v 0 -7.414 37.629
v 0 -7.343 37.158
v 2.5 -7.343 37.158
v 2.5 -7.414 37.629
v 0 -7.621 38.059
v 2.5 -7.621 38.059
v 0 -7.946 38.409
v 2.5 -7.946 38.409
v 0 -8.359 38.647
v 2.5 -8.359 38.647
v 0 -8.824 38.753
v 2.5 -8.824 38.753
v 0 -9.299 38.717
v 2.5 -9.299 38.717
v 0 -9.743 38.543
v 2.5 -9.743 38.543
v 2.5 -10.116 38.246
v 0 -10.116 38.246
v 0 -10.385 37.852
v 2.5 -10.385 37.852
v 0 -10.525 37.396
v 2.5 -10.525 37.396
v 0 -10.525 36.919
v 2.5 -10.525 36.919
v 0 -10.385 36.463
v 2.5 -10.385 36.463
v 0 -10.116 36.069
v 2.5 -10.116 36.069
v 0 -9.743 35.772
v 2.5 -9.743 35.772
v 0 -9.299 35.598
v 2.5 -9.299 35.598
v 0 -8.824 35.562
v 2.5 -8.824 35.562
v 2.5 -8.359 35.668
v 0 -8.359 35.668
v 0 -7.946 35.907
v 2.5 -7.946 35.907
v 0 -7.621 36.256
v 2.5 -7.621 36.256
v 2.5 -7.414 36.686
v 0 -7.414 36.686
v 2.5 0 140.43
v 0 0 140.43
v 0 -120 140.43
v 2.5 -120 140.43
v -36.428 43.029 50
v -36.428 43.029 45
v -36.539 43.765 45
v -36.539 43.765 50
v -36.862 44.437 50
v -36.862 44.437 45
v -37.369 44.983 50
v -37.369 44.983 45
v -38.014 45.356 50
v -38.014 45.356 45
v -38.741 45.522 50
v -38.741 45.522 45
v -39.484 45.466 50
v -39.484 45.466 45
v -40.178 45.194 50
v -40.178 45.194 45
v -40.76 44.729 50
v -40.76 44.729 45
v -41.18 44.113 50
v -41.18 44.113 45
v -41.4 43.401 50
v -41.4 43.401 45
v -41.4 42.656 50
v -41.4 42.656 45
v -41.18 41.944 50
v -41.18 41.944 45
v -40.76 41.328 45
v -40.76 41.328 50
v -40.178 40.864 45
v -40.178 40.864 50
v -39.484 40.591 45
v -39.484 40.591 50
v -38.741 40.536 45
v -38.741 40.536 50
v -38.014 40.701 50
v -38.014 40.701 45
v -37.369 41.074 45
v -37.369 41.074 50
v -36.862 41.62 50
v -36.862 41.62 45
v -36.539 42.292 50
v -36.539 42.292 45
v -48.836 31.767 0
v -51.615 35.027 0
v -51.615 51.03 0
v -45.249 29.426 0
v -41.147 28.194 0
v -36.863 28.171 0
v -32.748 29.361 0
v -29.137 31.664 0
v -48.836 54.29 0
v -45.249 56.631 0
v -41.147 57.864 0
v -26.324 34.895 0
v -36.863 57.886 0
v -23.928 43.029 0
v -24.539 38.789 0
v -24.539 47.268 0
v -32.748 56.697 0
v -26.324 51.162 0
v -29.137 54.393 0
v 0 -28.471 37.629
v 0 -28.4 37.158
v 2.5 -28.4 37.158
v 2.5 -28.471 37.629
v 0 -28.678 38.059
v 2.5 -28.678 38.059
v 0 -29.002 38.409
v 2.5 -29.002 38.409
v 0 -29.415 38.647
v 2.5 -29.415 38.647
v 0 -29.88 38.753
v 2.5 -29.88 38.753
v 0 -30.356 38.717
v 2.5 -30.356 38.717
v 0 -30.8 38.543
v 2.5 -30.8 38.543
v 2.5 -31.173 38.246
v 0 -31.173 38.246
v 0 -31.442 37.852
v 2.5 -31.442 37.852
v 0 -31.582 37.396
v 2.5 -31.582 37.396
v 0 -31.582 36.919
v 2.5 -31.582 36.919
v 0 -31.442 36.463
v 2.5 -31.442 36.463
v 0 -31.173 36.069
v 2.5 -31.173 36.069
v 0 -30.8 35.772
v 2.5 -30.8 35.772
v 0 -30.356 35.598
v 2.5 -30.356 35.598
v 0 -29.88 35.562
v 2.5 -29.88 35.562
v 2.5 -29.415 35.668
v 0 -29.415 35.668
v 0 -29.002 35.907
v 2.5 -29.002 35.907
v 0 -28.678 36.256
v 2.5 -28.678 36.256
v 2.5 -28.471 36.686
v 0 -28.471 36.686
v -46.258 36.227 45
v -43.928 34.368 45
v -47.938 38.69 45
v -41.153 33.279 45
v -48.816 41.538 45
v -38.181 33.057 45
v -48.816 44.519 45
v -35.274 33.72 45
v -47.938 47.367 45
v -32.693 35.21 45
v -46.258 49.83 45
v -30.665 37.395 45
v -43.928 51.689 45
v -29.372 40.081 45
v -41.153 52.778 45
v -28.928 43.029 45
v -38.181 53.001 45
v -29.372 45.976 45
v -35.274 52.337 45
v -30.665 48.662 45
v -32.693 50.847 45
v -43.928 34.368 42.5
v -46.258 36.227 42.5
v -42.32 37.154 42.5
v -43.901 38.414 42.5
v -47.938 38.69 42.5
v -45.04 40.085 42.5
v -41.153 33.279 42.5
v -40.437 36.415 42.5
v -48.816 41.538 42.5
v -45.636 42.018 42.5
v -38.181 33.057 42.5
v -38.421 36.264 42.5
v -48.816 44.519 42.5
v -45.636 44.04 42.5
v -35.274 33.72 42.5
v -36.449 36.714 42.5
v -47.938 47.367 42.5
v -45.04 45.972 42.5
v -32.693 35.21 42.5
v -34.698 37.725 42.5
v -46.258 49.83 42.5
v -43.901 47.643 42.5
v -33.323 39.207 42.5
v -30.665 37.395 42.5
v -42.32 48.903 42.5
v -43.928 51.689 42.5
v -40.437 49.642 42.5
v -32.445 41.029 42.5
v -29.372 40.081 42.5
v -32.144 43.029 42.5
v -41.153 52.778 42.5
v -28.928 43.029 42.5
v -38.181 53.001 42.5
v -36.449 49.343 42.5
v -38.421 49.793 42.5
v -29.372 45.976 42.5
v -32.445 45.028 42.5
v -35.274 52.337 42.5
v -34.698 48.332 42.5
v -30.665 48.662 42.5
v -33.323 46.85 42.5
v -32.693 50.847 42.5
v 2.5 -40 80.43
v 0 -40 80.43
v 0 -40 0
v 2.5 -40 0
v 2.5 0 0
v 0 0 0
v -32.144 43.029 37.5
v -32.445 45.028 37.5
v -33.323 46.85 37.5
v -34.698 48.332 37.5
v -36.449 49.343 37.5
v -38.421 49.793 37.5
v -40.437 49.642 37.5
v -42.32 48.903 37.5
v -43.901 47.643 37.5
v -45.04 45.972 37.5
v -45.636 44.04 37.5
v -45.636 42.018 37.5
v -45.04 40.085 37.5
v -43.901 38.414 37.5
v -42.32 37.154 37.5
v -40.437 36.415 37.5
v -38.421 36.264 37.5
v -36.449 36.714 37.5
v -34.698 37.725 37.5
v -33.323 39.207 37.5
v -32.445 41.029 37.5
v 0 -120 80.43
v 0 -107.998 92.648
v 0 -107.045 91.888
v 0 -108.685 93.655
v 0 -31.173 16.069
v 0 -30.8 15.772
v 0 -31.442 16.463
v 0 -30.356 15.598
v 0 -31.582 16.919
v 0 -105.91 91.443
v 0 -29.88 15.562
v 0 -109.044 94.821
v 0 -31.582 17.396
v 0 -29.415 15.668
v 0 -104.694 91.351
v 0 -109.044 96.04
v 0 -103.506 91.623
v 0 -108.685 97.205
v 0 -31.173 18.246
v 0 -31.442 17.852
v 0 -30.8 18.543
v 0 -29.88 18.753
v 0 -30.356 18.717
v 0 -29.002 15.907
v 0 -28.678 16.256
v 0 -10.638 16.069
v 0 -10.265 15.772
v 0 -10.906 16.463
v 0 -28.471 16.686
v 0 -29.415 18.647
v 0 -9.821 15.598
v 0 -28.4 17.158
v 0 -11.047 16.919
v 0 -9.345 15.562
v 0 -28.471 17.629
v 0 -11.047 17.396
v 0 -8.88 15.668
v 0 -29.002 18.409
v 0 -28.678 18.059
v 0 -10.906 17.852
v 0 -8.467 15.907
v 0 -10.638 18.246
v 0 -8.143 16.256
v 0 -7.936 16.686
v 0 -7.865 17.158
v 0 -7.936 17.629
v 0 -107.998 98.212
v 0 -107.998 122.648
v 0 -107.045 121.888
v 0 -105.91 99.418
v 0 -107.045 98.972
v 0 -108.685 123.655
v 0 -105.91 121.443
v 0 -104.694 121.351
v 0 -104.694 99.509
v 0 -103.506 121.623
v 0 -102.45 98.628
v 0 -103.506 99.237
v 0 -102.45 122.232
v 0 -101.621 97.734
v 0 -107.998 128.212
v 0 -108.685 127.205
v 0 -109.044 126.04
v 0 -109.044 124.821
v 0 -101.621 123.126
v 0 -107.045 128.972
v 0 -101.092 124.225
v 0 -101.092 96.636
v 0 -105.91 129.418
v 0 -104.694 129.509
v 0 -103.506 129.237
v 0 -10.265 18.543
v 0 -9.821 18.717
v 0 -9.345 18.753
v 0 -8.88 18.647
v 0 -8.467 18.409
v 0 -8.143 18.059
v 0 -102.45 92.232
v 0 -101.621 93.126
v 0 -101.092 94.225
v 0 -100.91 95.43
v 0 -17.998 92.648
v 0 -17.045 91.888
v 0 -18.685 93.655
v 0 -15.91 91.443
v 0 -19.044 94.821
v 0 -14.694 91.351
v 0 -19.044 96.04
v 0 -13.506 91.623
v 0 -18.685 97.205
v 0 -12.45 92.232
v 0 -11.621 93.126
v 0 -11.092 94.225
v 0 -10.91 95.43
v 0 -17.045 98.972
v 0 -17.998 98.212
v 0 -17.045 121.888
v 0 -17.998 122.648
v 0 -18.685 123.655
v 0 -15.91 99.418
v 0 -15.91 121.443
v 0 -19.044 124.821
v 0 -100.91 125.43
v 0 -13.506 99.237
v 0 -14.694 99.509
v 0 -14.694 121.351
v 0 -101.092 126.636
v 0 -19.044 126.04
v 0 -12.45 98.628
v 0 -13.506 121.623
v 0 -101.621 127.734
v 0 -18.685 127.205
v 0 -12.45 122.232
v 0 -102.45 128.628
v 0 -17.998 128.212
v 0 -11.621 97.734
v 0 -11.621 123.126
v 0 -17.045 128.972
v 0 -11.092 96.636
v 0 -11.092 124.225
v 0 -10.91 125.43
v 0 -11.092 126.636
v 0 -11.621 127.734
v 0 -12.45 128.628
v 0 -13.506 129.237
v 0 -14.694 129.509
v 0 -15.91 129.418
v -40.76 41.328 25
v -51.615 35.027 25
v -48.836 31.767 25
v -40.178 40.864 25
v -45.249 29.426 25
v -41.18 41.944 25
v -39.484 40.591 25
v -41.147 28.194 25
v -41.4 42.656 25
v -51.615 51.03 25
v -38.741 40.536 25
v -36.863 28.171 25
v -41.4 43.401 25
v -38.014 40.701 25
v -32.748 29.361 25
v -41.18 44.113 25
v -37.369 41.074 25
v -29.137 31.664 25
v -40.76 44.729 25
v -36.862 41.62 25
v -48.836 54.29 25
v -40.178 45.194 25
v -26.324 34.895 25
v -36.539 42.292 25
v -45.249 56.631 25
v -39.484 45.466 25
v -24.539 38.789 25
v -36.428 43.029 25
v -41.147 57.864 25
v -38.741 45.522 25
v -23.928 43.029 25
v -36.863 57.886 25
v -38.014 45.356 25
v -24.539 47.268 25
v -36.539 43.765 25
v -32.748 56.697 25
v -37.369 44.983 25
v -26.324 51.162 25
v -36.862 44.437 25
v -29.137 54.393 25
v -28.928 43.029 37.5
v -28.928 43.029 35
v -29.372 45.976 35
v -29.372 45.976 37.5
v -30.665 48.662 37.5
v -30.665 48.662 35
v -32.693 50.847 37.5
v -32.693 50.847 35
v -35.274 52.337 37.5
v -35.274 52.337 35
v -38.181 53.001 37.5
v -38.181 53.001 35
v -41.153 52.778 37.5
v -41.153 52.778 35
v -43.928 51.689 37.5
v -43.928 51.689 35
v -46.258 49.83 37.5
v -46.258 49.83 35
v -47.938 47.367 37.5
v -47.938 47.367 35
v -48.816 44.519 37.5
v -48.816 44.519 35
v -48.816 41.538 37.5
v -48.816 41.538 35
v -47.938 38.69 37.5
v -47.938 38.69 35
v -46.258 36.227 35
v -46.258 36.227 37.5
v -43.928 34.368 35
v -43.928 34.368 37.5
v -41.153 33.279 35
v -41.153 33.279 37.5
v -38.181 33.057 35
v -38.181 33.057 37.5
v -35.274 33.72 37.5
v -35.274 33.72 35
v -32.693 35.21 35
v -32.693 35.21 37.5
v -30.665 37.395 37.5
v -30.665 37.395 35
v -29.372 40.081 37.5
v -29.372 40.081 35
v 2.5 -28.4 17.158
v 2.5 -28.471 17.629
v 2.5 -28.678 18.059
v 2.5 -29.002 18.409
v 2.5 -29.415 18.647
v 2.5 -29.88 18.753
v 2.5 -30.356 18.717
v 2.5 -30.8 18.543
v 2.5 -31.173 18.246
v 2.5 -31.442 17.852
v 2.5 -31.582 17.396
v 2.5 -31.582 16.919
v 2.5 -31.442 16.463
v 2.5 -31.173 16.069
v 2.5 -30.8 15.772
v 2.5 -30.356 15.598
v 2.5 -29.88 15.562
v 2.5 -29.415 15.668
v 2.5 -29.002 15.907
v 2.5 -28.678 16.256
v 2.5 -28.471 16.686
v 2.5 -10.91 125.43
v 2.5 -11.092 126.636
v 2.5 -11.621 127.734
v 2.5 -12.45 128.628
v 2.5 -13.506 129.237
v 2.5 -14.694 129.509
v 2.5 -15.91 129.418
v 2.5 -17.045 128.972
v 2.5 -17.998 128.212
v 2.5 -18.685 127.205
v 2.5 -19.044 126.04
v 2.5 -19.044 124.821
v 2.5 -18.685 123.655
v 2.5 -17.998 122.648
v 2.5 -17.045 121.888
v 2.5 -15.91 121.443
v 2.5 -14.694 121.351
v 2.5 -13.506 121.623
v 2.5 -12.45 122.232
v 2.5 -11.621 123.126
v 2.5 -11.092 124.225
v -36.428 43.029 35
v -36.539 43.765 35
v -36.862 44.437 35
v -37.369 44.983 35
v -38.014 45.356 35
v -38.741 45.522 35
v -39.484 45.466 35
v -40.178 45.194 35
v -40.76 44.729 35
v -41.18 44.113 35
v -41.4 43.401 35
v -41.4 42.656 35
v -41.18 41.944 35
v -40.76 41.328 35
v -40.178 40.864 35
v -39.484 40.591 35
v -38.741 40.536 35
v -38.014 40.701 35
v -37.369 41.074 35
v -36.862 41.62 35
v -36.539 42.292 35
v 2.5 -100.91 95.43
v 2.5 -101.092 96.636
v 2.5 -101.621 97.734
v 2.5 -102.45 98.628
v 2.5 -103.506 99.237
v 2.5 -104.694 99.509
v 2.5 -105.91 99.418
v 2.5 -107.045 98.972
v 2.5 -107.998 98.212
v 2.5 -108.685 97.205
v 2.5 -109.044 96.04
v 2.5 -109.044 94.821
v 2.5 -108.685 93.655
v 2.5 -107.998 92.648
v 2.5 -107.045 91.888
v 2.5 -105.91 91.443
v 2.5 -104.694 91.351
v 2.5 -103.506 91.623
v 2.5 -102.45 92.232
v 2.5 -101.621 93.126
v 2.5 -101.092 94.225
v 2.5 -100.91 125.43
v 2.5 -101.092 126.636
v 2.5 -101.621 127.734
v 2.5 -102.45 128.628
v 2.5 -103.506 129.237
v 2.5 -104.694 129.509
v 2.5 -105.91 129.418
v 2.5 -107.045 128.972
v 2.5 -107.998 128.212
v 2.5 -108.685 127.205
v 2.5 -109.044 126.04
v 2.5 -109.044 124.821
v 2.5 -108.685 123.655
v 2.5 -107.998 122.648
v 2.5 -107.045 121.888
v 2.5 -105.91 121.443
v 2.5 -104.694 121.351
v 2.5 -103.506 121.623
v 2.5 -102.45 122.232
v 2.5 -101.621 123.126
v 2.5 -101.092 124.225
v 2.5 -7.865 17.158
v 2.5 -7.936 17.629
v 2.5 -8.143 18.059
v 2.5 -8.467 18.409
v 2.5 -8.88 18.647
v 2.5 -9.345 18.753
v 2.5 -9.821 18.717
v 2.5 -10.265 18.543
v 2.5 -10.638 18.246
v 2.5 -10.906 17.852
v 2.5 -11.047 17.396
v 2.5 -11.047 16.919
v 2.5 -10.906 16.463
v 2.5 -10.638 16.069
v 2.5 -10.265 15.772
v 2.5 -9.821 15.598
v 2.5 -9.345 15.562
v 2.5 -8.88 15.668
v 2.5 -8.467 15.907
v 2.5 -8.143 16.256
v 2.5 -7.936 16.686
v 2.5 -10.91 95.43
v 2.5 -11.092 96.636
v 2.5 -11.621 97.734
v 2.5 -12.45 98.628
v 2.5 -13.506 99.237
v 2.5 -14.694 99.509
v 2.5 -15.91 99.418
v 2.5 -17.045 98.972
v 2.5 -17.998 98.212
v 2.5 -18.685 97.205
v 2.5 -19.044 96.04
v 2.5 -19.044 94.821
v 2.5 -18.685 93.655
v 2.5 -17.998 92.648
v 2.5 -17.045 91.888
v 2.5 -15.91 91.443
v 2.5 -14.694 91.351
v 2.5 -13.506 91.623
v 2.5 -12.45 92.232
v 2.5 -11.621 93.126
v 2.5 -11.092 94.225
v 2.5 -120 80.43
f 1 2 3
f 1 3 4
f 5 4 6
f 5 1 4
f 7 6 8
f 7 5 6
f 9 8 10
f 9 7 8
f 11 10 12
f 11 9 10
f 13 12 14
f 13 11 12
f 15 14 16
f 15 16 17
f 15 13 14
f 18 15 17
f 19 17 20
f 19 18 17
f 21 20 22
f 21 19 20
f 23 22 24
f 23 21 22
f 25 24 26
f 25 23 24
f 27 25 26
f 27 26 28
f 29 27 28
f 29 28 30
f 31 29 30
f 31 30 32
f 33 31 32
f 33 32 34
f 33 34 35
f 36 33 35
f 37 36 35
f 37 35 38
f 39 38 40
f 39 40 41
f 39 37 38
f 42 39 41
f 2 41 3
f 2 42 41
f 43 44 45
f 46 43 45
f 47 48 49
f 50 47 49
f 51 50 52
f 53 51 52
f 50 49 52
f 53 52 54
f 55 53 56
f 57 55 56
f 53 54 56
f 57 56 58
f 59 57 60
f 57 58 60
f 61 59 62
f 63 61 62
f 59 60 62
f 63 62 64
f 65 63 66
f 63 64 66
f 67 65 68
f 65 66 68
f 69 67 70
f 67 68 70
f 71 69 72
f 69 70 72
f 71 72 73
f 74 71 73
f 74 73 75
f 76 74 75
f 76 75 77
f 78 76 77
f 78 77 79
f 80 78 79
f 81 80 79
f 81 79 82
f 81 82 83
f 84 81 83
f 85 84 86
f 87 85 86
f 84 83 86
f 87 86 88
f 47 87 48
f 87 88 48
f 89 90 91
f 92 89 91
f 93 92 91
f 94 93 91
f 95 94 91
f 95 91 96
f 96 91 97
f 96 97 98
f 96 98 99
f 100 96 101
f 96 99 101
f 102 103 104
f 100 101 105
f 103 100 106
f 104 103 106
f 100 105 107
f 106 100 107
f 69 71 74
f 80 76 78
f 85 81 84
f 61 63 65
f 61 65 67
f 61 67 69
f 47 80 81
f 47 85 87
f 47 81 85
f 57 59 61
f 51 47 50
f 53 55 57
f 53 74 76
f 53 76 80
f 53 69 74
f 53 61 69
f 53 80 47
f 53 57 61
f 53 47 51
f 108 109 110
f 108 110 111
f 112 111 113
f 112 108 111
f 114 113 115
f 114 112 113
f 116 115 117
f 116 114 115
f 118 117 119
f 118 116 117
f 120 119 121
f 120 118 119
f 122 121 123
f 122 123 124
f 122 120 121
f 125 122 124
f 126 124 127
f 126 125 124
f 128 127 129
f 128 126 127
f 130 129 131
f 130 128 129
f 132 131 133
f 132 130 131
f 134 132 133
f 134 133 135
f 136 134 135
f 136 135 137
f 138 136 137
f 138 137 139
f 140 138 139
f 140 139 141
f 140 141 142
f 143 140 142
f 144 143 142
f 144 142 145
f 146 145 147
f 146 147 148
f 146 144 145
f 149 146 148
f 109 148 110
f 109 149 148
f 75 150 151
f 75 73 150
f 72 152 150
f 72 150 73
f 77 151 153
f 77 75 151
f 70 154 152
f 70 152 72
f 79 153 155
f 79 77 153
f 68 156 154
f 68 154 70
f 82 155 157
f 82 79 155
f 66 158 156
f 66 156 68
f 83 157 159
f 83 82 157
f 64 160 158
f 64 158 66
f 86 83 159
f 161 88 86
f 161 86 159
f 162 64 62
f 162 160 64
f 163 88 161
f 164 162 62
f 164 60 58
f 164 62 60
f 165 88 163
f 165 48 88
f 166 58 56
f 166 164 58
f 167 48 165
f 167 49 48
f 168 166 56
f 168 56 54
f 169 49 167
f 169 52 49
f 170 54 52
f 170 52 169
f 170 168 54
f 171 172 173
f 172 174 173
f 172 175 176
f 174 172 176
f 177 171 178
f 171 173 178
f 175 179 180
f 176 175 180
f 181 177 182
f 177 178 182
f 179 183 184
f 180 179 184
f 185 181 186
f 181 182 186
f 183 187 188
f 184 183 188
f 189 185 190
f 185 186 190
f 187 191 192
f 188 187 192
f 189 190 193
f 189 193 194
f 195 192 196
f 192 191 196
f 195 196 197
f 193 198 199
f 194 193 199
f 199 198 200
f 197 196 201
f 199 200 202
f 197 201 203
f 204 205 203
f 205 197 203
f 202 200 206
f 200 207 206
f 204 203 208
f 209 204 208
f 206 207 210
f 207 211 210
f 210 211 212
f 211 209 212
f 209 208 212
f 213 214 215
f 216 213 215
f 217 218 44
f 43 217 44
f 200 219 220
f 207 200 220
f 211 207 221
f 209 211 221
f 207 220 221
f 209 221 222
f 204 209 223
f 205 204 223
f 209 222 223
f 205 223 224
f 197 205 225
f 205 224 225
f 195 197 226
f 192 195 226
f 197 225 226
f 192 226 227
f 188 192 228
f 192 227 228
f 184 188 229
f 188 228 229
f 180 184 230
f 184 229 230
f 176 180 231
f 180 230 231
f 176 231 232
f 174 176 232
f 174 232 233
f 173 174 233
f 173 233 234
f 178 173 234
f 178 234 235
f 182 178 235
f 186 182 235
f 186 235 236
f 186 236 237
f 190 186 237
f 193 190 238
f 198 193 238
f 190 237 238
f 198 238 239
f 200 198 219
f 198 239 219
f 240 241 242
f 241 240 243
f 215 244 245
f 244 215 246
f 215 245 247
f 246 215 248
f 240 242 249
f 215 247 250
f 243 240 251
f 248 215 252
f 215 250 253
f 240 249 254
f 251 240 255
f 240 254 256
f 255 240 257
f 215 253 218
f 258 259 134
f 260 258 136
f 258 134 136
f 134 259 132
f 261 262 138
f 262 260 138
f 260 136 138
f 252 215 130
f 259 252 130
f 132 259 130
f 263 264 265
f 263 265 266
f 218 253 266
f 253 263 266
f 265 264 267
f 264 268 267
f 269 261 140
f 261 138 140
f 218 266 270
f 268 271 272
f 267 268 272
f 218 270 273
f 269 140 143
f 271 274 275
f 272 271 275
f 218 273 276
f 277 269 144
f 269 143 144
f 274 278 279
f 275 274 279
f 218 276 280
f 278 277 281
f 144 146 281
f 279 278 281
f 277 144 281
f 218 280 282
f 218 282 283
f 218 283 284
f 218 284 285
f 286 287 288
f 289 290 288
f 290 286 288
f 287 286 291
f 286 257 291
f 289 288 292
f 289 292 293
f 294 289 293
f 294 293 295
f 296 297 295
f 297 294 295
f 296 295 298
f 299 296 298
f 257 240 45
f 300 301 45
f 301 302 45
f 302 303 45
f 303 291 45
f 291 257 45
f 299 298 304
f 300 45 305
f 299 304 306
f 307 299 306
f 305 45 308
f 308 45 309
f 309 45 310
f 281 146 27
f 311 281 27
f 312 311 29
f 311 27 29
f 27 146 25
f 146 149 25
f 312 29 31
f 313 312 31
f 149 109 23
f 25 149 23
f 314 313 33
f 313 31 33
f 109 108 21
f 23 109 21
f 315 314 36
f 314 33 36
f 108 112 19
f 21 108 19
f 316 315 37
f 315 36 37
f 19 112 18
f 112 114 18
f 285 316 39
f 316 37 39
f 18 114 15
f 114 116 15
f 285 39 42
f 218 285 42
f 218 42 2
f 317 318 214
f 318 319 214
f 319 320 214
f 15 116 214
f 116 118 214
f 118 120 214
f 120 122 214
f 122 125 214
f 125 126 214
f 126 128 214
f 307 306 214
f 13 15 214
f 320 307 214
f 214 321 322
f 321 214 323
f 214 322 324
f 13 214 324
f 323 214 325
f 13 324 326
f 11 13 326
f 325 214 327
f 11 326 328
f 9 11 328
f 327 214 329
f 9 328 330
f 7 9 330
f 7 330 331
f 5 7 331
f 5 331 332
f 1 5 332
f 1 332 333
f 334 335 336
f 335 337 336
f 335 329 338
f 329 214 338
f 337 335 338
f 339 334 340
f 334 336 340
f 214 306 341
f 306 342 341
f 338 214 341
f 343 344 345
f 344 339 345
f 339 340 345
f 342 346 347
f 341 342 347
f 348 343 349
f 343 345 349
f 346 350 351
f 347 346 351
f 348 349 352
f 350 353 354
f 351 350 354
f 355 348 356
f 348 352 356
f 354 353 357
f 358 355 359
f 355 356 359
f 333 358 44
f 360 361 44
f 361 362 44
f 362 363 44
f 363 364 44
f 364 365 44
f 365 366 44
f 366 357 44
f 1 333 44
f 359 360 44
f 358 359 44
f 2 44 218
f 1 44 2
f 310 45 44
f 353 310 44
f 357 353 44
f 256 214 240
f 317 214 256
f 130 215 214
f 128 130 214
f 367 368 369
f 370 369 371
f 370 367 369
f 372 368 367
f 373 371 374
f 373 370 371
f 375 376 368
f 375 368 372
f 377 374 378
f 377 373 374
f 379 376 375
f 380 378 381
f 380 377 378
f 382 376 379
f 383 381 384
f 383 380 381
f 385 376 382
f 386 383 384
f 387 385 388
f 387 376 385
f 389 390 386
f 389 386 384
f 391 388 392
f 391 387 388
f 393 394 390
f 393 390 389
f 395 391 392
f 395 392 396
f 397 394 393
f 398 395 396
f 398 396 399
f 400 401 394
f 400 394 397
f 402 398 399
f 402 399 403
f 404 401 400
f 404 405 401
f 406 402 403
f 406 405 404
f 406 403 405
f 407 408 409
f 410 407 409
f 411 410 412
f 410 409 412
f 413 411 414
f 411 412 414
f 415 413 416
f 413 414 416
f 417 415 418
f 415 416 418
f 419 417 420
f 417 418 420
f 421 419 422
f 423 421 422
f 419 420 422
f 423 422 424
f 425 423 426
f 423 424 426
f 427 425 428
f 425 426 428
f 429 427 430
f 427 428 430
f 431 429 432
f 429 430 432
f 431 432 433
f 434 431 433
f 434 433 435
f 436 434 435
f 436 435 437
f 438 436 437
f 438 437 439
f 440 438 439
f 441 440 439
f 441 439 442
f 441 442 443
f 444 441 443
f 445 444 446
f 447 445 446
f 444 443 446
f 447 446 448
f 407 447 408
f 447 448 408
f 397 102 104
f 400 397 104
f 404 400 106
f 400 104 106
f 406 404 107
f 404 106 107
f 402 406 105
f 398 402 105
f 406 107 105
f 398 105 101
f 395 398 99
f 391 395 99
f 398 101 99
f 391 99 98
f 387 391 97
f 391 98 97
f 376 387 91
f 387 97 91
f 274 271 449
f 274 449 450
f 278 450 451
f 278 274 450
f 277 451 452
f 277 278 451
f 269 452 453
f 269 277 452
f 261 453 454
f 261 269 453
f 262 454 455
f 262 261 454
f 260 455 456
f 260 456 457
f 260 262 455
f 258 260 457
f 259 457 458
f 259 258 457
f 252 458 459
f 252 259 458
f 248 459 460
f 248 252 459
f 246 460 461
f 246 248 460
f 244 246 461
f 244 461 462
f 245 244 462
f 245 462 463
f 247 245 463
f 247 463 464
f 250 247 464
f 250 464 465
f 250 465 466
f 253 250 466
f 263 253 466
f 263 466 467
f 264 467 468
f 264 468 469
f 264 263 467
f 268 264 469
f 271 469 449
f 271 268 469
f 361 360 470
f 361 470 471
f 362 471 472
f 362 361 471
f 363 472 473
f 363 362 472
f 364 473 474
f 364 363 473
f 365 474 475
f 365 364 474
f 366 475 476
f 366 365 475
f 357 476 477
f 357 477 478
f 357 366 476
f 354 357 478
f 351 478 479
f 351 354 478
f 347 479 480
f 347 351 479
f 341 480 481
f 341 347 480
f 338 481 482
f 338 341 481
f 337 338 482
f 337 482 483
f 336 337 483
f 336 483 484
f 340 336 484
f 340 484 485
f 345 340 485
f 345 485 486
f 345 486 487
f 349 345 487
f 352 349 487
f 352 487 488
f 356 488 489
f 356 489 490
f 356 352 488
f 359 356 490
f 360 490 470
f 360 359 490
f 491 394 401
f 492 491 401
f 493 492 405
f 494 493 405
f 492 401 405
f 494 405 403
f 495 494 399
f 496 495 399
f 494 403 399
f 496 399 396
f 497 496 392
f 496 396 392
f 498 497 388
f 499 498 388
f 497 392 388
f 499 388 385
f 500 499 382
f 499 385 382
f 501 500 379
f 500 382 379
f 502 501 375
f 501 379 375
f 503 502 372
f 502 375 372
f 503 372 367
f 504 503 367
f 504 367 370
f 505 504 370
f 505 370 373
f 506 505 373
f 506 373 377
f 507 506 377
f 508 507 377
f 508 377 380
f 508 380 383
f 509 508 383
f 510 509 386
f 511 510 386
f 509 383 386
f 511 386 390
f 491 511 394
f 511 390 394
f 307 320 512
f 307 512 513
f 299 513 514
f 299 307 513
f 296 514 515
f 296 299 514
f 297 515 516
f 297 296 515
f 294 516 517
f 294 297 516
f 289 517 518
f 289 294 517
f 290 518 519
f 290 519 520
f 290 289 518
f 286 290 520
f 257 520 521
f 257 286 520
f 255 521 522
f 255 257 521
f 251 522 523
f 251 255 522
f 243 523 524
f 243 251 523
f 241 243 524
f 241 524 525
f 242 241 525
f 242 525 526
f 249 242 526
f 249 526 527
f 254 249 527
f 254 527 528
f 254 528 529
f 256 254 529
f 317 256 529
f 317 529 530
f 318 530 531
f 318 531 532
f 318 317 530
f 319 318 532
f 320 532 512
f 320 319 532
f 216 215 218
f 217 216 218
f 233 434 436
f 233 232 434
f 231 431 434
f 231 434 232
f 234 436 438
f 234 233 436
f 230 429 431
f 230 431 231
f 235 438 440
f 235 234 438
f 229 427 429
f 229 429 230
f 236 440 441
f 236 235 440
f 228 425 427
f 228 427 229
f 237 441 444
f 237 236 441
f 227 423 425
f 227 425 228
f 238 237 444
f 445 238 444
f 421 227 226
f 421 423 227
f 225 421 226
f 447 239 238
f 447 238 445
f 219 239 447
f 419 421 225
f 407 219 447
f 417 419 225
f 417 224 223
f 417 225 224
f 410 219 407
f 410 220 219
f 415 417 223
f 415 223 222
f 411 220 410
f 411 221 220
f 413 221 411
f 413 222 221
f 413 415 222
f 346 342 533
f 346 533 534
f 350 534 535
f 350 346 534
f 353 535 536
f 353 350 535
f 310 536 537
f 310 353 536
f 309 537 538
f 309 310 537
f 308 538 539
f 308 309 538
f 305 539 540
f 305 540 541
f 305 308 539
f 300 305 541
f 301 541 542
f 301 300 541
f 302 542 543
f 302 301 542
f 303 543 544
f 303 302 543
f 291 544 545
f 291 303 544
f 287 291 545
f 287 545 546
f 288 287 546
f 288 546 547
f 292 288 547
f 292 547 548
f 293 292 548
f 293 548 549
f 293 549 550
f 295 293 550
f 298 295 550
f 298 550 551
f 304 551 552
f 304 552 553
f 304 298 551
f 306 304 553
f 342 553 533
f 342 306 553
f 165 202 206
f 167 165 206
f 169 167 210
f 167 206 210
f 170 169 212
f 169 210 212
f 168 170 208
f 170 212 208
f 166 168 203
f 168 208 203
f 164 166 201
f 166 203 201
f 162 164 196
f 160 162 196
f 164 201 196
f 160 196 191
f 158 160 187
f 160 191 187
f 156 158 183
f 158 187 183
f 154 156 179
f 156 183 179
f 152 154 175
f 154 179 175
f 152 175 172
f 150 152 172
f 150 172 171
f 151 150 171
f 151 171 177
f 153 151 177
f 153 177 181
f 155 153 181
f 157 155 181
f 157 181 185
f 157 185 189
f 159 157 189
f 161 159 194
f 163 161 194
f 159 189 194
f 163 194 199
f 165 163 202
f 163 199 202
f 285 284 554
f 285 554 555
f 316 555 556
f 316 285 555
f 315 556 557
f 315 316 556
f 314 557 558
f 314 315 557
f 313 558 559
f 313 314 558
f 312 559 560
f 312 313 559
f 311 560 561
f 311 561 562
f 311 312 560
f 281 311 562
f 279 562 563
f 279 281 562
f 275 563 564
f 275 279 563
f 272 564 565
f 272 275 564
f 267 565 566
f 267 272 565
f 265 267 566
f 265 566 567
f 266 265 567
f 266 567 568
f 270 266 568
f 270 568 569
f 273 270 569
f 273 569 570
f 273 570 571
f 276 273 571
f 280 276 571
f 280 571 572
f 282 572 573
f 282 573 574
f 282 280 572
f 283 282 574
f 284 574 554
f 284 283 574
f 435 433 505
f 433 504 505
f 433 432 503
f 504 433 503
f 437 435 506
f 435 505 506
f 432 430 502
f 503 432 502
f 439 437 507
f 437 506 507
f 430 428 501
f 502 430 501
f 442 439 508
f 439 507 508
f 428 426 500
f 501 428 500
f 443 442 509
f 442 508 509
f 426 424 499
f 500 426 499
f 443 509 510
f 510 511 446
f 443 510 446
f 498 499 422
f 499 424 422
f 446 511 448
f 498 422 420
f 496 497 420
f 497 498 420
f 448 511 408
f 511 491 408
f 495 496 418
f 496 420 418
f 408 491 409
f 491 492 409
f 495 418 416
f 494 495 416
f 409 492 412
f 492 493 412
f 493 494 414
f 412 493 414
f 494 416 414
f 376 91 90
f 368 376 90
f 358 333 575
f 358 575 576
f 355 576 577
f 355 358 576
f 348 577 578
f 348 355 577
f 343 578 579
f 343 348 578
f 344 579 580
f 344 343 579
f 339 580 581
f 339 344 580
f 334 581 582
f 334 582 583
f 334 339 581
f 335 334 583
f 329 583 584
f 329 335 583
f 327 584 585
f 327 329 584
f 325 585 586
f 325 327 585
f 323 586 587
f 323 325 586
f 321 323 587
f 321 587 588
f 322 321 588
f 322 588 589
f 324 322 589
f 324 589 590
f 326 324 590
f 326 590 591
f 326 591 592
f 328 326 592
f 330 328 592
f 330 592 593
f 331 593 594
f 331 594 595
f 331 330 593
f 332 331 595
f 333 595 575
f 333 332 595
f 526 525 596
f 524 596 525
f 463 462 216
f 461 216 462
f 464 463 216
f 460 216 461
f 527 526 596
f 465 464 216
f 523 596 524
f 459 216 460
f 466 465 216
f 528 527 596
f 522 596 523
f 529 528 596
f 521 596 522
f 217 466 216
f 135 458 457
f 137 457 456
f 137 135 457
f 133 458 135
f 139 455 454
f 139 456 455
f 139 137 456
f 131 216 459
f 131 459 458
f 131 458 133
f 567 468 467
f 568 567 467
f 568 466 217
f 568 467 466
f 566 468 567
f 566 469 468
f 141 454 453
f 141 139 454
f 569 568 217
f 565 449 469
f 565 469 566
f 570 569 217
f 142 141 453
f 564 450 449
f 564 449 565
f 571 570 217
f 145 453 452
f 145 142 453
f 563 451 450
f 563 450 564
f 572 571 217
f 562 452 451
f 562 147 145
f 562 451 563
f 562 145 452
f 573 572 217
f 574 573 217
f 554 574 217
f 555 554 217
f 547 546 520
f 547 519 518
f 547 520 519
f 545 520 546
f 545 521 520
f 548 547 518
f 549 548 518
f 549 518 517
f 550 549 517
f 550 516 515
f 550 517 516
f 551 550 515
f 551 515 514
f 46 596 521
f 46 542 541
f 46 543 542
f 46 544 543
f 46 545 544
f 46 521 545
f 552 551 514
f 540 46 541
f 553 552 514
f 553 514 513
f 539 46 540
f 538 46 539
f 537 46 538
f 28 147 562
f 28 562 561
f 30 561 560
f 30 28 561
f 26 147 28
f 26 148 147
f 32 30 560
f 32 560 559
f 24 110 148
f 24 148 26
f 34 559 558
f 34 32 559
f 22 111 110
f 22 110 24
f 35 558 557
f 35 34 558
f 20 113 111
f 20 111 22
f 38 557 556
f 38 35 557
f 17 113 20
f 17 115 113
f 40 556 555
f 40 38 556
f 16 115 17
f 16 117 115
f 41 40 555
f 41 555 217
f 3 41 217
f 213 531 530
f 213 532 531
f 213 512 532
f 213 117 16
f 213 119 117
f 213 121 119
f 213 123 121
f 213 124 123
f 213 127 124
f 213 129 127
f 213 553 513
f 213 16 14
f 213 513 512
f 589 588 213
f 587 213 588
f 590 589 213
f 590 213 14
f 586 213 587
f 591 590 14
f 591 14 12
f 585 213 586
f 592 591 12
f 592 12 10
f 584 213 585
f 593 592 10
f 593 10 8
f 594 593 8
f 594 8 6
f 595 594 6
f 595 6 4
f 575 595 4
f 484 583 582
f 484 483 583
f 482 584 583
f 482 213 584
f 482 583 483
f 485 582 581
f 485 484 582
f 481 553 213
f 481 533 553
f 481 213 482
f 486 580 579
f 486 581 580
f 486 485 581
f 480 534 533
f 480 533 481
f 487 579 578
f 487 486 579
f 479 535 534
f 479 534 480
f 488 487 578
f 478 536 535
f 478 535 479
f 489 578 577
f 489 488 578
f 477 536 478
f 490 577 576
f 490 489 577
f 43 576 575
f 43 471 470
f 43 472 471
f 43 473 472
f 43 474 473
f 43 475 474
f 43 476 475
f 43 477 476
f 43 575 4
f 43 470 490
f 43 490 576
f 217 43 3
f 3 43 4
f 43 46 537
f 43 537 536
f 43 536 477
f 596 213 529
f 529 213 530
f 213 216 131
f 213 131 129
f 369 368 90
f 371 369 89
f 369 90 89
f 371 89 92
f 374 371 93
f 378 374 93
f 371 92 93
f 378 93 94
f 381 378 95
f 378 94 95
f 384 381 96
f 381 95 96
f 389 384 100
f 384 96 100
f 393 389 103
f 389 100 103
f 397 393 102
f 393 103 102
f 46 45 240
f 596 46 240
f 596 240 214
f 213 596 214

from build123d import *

# Parameters (mm, degrees)
F0_R      = 1.6
F0_R_2    = 4.0900821391
F0_R_3    = 8.5154019065
F1_DEPTH  = 2.5
F3_DEPTH  = 25
F4_R      = 2.5
F5_DEPTH  = 10
F6_R      = 10
F6_R_2    = 2.5
F7_DEPTH  = 2.5
F8_R      = 6.7837537735
F9_DEPTH  = 5
F10_R     = 10
F10_R_2   = 6.7837537735
F11_DEPTH = 2.5
F12_R     = 2.5
F13_DEPTH = 5


with BuildPart() as f1:
    # F0 (on Right) → F1 (new body)
    with BuildSketch(Plane.YZ):
        Polygon((-40, 0), (0, 0), (0, 140.4301102979), (-120, 140.4301102979), (-120, 80.4301102979), (-40, 80.4301102979), align=None)
        with Locations((-30, 17.1576072229)):
            Circle(F0_R, mode=Mode.SUBTRACT)
        with Locations((-9.4648276111, 17.1576072229)):
            Circle(F0_R, mode=Mode.SUBTRACT)
        with Locations((-30, 37.1576072229)):
            Circle(F0_R, mode=Mode.SUBTRACT)
        with Locations((-8.9432526233, 37.1576072229)):
            Circle(F0_R, mode=Mode.SUBTRACT)
        with Locations((-105, 95.4301102979)):
            Circle(F0_R_2, mode=Mode.SUBTRACT)
        with Locations((-105, 125.4301102979)):
            Circle(F0_R_2, mode=Mode.SUBTRACT)
        with Locations((-15, 95.4301102979)):
            Circle(F0_R_2, mode=Mode.SUBTRACT)
        with Locations((-60, 110.4301102979)):
            Circle(F0_R_3, mode=Mode.SUBTRACT)
        with Locations((-15, 125.4301102979)):
            Circle(F0_R_2, mode=Mode.SUBTRACT)
        with Locations((-60, 110.4301102979)):
            Circle(F0_R_3)
    extrude(amount=F1_DEPTH)


with BuildPart() as f3:
    # F2 (on Top) → F3 (new body)
    with BuildSketch(Plane.XY):
        with BuildLine():
            ThreePointArc((-51.6152642667, 35.026761755), (-34.7631884448, 28.6183173725), (-23.927834481, 43.0285818875))
            ThreePointArc((-23.927834481, 43.0285818875), (-34.7631884448, 57.4388464025), (-51.6152642667, 51.0304020199))
            Line((-51.6152642667, 51.0304020199), (-51.6152642667, 43.0285818875))
            Line((-51.6152642667, 43.0285818875), (-51.6152642667, 35.026761755))
        make_face()
    extrude(amount=F3_DEPTH)

    # F4 (on face) → F5 (join)
    with BuildSketch(Plane.XY.offset(25)):
        with Locations((-38.927834481, 43.0285818875)):
            Circle(F4_R)
    extrude(amount=F5_DEPTH)

    # F6 (on face) → F7 (join)
    with BuildSketch(Plane.XY.offset(35)):
        with Locations((-38.927834481, 43.0285818875)):
            Circle(F6_R)
        with Locations((-38.927834481, 43.0285818875)):
            Circle(F6_R_2, mode=Mode.SUBTRACT)
        with Locations((-38.927834481, 43.0285818875)):
            Circle(F6_R_2)
    extrude(amount=F7_DEPTH)

    # F8 (on face) → F9 (join)
    with BuildSketch(Plane.XY.offset(37.5)):
        with Locations((-38.927834481, 43.0285818875)):
            Circle(F8_R)
    extrude(amount=F9_DEPTH)

    # F10 (on face) → F11 (join)
    with BuildSketch(Plane.XY.offset(42.5)):
        with Locations((-38.927834481, 43.0285818875)):
            Circle(F10_R)
        with Locations((-38.927834481, 43.0285818875)):
            Circle(F10_R_2, mode=Mode.SUBTRACT)
        with Locations((-38.927834481, 43.0285818875)):
            Circle(F10_R_2)
    extrude(amount=F11_DEPTH)

    # F12 (on face) → F13 (join)
    with BuildSketch(Plane.XY.offset(45)):
        with Locations((-38.927834481, 43.0285818875)):
            Circle(F12_R)
    extrude(amount=F13_DEPTH)


solid = Compound([f1.part, f3.part])
